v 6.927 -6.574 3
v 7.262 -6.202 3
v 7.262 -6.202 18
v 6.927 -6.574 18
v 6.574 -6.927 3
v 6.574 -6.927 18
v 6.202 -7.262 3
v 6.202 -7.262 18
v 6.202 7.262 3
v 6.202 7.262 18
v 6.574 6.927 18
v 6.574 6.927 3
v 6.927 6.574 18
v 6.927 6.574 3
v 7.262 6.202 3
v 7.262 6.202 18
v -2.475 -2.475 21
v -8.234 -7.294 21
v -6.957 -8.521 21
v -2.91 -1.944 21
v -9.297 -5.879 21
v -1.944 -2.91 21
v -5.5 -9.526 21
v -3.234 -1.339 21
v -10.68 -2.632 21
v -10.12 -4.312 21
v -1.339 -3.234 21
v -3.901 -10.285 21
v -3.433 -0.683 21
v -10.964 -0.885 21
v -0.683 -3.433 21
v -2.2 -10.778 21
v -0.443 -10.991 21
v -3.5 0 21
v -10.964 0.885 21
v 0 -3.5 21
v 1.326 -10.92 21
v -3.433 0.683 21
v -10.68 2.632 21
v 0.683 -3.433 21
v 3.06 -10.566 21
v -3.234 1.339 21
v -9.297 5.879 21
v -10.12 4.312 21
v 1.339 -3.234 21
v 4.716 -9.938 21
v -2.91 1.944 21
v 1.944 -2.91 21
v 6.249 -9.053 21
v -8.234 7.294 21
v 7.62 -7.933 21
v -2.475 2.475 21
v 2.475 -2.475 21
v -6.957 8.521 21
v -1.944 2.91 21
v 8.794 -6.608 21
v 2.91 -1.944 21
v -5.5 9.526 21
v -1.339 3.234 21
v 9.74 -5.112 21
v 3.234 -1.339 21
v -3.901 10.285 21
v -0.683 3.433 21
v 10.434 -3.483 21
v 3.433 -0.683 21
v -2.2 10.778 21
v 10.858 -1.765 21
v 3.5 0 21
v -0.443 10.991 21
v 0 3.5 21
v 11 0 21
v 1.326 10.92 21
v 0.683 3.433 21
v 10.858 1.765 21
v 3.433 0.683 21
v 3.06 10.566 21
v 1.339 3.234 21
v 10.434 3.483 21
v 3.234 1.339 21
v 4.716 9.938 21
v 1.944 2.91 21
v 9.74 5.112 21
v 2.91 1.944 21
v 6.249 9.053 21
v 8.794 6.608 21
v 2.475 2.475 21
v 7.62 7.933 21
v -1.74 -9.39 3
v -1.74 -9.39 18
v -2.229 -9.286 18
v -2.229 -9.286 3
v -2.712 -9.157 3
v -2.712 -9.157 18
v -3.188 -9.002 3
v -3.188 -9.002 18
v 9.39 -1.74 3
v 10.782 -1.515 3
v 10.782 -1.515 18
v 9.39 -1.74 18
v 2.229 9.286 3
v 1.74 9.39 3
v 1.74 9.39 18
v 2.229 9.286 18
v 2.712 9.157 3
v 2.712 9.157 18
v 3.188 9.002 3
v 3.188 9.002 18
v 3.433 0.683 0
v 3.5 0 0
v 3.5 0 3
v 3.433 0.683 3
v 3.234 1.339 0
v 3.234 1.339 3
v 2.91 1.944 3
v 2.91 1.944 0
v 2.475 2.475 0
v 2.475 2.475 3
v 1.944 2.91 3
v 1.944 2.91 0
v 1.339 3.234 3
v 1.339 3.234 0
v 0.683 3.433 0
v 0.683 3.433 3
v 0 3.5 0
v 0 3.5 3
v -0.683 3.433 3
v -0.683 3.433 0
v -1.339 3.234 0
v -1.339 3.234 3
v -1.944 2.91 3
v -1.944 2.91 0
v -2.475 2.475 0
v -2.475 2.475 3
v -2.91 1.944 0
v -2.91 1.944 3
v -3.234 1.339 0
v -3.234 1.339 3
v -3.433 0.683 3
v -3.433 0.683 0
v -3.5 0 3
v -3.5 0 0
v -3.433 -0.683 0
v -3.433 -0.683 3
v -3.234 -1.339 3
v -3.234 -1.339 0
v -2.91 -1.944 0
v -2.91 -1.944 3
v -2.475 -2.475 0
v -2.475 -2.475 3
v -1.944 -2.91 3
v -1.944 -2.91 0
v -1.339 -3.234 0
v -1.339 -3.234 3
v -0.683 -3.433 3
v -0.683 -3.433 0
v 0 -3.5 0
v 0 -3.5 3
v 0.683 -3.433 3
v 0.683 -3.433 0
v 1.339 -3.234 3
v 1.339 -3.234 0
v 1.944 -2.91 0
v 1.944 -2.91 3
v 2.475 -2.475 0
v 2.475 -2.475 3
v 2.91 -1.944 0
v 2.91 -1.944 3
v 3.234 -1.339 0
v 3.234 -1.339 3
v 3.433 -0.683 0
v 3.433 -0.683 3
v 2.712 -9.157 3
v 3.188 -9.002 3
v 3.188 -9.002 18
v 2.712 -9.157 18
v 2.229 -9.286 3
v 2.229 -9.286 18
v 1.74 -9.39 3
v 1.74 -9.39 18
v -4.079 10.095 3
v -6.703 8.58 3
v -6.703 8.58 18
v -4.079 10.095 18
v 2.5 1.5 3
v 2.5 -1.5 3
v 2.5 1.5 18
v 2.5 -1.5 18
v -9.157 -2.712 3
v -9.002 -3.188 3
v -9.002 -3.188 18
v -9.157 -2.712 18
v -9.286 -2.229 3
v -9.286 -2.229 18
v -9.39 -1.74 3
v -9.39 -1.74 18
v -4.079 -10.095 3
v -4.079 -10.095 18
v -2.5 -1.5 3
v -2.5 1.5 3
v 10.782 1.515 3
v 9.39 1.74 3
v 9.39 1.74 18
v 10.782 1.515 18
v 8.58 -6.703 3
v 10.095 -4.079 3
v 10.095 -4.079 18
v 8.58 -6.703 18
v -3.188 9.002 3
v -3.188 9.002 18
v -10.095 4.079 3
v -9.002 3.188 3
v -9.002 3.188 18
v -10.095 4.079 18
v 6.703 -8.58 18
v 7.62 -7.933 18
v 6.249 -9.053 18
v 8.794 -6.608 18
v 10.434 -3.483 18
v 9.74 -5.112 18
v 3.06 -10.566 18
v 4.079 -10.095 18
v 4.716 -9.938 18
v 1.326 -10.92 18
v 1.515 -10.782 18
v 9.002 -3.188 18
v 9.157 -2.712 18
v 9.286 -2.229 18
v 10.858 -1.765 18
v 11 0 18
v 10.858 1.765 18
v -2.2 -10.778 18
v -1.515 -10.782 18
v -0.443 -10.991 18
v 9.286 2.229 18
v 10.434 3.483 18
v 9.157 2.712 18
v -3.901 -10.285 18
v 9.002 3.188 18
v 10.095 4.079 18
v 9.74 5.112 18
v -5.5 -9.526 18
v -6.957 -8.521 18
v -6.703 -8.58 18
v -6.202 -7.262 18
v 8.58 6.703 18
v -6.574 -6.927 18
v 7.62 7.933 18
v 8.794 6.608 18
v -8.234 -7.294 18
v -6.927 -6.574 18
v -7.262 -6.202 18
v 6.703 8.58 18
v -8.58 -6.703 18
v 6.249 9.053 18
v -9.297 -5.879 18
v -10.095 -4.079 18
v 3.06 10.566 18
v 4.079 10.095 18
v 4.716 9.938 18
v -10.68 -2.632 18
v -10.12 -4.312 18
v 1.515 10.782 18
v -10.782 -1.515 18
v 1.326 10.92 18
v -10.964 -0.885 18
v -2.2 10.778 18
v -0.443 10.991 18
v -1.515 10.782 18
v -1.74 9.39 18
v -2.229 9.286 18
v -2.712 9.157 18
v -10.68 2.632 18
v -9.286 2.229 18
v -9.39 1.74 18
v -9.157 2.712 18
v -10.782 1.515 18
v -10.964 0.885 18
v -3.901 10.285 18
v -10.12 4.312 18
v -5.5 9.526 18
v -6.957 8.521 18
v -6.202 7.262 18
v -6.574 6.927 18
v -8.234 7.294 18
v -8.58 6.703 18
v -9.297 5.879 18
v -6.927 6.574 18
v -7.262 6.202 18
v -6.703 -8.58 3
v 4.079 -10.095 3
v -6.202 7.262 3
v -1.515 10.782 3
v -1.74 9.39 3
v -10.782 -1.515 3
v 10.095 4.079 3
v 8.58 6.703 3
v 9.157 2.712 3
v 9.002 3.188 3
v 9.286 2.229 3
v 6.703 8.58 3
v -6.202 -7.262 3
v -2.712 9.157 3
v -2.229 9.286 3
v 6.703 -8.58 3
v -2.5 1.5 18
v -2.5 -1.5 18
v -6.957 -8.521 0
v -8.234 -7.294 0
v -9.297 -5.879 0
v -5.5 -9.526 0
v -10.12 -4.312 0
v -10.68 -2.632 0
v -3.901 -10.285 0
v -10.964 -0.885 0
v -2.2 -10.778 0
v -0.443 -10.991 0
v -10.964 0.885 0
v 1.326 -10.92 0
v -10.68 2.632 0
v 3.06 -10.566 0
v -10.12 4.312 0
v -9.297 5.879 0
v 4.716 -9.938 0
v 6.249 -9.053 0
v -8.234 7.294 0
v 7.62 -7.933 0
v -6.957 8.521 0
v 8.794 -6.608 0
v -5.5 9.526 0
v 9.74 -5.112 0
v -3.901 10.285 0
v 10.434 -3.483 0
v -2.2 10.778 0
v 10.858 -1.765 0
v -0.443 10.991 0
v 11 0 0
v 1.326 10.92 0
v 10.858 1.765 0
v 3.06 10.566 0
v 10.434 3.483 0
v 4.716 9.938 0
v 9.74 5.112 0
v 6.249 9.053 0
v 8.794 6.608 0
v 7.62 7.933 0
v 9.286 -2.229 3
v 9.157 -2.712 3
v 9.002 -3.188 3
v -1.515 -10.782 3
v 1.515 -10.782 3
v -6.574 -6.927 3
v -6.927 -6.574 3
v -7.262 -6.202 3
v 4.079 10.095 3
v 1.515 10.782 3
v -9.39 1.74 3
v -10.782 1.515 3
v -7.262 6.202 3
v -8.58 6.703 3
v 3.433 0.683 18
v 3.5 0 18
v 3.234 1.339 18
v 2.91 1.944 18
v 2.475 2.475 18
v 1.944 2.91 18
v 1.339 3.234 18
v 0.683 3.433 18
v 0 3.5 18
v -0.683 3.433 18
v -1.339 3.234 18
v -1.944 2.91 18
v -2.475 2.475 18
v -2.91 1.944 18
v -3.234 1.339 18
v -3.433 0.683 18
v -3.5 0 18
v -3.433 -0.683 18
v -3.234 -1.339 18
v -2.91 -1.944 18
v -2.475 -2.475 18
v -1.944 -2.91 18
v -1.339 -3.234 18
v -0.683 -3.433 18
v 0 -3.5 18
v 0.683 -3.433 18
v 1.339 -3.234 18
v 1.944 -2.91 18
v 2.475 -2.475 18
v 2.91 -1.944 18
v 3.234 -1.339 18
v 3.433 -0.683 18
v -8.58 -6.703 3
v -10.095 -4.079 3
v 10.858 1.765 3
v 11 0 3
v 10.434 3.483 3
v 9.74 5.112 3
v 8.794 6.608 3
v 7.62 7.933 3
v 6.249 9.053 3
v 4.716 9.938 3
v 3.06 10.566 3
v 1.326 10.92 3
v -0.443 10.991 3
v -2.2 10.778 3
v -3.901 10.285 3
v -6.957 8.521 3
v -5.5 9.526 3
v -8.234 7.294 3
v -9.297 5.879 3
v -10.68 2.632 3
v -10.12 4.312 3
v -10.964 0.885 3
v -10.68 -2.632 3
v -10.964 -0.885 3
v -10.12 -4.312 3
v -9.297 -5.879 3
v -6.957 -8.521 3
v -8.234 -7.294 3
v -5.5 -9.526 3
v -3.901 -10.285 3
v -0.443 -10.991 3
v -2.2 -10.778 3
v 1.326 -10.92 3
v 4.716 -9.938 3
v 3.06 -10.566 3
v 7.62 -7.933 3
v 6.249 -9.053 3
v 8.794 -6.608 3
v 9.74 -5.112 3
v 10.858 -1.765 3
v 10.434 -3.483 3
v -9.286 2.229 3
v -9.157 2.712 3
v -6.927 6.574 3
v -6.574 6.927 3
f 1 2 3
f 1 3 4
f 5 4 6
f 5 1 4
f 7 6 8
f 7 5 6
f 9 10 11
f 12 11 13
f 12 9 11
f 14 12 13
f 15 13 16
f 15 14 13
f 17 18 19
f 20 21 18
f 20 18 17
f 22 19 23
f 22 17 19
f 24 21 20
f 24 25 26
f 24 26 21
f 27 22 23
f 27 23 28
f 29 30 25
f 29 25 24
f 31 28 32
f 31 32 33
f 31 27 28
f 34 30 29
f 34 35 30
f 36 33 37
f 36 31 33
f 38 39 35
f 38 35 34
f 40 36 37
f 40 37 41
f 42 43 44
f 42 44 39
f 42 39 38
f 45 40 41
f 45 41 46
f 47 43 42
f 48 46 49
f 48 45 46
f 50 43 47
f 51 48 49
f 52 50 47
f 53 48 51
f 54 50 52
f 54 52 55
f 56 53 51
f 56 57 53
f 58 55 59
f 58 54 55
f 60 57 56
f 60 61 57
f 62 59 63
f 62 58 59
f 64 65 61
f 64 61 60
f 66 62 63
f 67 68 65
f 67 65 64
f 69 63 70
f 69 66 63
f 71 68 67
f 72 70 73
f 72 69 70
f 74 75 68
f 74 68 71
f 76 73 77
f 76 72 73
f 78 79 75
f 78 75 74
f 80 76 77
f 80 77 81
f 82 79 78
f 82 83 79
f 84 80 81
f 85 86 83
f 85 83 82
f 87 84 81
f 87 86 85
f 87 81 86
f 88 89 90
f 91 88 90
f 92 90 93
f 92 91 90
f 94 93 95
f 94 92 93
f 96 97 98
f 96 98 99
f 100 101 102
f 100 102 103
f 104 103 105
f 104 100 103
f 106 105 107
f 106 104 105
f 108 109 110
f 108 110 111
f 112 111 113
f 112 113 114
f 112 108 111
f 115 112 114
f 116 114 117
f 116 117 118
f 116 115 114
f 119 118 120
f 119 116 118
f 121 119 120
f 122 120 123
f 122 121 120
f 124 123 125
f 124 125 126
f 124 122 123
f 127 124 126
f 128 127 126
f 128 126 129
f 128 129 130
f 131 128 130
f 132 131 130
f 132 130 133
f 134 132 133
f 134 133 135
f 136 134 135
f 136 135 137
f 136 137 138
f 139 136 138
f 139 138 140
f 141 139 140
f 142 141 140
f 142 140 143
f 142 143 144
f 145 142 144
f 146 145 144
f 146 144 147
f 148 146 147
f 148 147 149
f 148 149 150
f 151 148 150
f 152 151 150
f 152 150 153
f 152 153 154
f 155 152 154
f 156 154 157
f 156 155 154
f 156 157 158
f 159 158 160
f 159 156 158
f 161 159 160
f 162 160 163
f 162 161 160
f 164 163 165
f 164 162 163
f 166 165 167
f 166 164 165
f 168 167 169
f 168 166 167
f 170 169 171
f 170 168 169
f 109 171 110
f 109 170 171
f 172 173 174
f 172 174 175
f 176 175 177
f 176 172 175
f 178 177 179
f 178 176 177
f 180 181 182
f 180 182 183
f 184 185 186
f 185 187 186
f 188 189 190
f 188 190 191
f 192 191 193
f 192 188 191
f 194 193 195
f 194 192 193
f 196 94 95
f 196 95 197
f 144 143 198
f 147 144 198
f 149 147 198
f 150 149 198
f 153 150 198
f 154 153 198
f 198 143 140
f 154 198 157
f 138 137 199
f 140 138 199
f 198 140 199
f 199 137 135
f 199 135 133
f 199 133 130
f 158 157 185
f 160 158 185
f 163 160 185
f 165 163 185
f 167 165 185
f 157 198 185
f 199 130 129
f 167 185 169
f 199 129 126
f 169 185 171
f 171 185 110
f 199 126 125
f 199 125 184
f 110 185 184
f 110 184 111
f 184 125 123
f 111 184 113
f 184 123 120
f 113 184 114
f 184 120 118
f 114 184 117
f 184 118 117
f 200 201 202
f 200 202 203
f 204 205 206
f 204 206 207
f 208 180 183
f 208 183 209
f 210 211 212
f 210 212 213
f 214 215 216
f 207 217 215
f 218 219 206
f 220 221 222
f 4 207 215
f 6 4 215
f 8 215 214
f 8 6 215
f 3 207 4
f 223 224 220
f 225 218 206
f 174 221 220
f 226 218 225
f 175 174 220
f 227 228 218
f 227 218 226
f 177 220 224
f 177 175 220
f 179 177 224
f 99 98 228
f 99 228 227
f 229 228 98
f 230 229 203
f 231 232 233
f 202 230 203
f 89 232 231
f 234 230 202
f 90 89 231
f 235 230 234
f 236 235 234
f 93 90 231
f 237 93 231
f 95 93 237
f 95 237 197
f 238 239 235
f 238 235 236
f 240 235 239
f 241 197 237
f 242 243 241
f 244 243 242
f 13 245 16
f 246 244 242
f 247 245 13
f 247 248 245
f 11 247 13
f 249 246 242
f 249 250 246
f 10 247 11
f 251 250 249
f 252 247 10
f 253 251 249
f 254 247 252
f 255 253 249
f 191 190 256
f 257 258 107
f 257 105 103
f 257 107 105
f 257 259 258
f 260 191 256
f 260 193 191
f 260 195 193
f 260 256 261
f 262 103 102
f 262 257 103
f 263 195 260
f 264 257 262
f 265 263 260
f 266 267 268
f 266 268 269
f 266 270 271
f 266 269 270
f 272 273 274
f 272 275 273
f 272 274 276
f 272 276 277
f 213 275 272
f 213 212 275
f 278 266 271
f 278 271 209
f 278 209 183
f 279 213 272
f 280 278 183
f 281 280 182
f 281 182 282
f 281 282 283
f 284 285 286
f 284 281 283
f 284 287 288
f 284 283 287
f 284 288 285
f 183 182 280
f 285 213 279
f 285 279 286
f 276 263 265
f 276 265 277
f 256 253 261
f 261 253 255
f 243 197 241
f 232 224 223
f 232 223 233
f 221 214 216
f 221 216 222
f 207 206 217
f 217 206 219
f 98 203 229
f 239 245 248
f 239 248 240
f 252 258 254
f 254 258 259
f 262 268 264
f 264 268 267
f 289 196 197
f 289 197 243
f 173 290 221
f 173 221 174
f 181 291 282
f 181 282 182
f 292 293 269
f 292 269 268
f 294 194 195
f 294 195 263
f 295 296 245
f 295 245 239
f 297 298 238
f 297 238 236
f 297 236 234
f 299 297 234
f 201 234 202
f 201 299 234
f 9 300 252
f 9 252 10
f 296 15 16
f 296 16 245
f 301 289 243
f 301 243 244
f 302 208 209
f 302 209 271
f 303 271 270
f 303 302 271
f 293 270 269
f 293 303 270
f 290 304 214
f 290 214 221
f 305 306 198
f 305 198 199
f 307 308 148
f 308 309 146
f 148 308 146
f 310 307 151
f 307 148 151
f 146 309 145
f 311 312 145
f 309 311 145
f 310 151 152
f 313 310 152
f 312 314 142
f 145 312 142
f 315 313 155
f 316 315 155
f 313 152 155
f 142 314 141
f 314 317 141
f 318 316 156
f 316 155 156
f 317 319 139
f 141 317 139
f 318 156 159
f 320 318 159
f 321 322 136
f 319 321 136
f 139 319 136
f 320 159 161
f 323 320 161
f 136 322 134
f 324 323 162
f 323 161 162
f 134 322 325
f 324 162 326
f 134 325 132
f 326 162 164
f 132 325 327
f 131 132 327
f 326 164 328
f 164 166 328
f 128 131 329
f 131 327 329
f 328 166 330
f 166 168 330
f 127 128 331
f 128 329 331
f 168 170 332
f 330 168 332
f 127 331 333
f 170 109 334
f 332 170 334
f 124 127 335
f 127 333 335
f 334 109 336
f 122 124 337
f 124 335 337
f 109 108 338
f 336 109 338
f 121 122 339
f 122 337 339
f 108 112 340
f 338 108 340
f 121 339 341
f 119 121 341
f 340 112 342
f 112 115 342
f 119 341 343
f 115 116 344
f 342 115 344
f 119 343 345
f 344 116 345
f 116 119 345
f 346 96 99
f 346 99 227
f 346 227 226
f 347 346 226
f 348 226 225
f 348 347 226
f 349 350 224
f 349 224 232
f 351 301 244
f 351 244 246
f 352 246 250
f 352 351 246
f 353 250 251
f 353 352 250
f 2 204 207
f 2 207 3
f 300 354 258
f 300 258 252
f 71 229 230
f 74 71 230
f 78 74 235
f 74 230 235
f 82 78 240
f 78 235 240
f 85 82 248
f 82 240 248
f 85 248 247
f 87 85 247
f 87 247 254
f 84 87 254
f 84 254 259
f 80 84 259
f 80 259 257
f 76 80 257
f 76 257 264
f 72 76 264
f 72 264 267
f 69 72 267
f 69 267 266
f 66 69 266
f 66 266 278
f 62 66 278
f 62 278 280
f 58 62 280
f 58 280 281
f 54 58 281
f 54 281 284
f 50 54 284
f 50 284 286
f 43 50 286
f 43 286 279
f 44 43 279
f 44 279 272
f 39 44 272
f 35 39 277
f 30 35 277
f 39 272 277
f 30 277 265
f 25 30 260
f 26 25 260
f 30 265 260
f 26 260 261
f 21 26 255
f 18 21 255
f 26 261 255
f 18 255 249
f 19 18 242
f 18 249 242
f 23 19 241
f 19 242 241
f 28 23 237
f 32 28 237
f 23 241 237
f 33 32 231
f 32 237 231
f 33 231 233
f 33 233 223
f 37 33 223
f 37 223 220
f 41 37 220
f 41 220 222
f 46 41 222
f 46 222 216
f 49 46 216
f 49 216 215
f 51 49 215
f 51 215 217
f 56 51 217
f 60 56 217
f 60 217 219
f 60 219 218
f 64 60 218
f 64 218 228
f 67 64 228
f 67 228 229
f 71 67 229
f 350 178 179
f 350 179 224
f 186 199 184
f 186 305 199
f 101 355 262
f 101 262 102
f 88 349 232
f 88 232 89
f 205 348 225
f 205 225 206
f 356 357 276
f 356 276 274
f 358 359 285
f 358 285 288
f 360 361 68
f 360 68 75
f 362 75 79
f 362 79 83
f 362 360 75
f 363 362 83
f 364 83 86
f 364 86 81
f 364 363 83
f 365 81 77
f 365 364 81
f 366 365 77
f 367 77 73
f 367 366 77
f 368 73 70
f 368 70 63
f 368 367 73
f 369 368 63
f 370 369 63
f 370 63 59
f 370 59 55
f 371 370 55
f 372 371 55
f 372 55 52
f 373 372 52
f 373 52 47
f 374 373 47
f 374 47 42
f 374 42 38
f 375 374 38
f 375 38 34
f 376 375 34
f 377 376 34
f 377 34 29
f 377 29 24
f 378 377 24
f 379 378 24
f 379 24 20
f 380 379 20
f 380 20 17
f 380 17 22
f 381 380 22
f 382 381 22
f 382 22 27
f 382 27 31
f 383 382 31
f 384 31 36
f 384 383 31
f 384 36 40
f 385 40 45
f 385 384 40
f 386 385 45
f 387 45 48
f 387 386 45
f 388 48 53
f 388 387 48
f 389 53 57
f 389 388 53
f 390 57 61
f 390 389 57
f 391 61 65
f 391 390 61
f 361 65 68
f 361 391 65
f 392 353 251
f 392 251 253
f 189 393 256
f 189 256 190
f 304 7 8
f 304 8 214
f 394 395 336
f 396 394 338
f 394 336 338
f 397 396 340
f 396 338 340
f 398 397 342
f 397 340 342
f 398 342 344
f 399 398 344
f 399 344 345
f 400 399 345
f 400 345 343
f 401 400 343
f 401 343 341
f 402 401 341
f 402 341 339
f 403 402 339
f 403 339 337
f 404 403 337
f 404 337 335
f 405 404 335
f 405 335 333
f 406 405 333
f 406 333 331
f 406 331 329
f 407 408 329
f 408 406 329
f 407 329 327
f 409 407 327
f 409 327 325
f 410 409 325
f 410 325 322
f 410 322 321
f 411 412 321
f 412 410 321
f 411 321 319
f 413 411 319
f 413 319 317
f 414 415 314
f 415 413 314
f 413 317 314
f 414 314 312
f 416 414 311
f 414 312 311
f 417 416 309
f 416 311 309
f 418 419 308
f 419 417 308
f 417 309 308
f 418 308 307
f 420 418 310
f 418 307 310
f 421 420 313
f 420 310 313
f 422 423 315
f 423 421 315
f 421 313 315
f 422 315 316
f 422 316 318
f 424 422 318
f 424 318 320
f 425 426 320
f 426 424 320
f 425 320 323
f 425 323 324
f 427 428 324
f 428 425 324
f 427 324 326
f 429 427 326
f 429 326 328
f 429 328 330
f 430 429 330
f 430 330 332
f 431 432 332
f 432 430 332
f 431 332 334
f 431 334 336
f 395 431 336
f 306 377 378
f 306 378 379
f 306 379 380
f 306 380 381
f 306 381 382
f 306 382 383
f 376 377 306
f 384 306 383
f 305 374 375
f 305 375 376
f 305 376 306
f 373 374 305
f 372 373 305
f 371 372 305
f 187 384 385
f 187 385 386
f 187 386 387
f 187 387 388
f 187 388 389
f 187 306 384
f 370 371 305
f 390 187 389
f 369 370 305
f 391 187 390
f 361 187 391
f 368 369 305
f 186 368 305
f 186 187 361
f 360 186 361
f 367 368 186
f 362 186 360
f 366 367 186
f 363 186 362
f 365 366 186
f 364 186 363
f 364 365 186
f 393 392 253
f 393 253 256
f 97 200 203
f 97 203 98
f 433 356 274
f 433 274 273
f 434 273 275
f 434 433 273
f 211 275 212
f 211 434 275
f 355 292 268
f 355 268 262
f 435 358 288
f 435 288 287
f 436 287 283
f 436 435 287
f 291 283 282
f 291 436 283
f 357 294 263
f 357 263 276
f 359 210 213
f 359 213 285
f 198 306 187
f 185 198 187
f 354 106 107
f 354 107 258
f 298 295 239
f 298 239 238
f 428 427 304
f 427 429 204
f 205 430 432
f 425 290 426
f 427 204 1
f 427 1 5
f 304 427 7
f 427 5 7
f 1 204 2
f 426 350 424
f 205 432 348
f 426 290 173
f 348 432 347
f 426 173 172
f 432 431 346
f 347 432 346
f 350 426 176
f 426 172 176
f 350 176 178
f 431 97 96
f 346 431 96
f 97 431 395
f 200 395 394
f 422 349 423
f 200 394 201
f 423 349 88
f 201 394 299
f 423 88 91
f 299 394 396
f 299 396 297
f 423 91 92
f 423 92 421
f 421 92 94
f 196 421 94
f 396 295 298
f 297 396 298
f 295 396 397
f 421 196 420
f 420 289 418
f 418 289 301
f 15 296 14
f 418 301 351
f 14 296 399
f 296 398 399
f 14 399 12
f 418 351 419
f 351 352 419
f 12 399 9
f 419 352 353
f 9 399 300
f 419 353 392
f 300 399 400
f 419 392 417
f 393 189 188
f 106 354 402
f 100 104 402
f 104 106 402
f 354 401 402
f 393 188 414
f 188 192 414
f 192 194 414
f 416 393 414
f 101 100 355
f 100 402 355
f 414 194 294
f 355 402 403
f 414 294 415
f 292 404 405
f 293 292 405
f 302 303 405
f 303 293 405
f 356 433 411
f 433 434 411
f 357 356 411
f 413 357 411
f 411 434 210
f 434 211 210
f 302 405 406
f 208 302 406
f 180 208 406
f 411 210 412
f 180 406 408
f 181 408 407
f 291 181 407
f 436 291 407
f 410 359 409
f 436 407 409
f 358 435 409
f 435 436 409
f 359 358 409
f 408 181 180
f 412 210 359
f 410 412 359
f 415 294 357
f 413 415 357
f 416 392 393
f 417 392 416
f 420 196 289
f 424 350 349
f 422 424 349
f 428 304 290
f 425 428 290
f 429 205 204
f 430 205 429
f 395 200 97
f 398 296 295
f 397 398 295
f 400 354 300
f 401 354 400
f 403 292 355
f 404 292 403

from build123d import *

# Parameters (mm, degrees)
ESQUISSE1_R                  = 11
ESQUISSE1_R_2                = 3.5
BOSS_EXTRU_1_DEPTH           = 21
ESQUISSE3_R                  = 28.5
ESQUISSE3_R_2                = 9.55
ENL_V_MAT_EXTRU_1_DEPTH      = 15
BOSS_EXTRU_2_DEPTH           = 15
R_P_TITION_CIRCULAIRE1_COUNT = 12
BOSS_EXTRUDE1_START          = 10.5
ESQUISSE1_3_R                = 3.5
ESQUISSE1_3_W                = 5
ESQUISSE1_3_H                = 3
BOSS_EXTRUDE1_DEPTH          = 7.5


with BuildPart() as part:
    # Esquisse1 → Boss.-Extru.1 (new body)
    with BuildSketch(Plane.XY):
        Circle(ESQUISSE1_R)
        Circle(ESQUISSE1_R_2, mode=Mode.SUBTRACT)
    extrude(amount=BOSS_EXTRU_1_DEPTH)

    # Esquisse3 → Enlèv. mat.-Extru.1 (cut)
    with BuildSketch(Plane(origin=(0, 0, 3), x_dir=(-1, 0, 0), z_dir=(0, 0, -1))):
        Circle(ESQUISSE3_R)
        Circle(ESQUISSE3_R_2, mode=Mode.SUBTRACT)
    extrude(amount=-ENL_V_MAT_EXTRU_1_DEPTH, mode=Mode.SUBTRACT)

    # Esquisse5 → Boss.-Extru.2 (add)
    with BuildSketch(Plane.XY.offset(3)):
        with BuildLine():
            Line((-1.740349268, 9.390084367), (-1.515334698, 10.782166631))
            Line((-1.515334698, 10.782166631), (1.515334698, 10.782166631))
            Line((1.515334698, 10.782166631), (1.740349268, 9.390084367))
            ThreePointArc((1.740349268, 9.390084367), (0, 9.55), (-1.740349268, 9.390084367))
        make_face()
    boss_extru_2 = extrude(amount=BOSS_EXTRU_2_DEPTH)

    # Répétition circulaire1: Boss.-Extru.2 ×12 about axis
    r_p_tition_circulaire1_axis = Axis((0, 0, 0), (0, 0, 1))
    for i in range(1, R_P_TITION_CIRCULAIRE1_COUNT):
        add(boss_extru_2.rotate(r_p_tition_circulaire1_axis, i * 360 / R_P_TITION_CIRCULAIRE1_COUNT))

    # Esquisse1<3> → Boss-Extrude1 (add, symmetric)
    with BuildSketch(Plane.XY.offset(BOSS_EXTRUDE1_START)):
        Circle(ESQUISSE1_3_R)
        Rectangle(ESQUISSE1_3_W, ESQUISSE1_3_H, mode=Mode.SUBTRACT)
    extrude(amount=BOSS_EXTRUDE1_DEPTH, both=True)


solid = part.part
